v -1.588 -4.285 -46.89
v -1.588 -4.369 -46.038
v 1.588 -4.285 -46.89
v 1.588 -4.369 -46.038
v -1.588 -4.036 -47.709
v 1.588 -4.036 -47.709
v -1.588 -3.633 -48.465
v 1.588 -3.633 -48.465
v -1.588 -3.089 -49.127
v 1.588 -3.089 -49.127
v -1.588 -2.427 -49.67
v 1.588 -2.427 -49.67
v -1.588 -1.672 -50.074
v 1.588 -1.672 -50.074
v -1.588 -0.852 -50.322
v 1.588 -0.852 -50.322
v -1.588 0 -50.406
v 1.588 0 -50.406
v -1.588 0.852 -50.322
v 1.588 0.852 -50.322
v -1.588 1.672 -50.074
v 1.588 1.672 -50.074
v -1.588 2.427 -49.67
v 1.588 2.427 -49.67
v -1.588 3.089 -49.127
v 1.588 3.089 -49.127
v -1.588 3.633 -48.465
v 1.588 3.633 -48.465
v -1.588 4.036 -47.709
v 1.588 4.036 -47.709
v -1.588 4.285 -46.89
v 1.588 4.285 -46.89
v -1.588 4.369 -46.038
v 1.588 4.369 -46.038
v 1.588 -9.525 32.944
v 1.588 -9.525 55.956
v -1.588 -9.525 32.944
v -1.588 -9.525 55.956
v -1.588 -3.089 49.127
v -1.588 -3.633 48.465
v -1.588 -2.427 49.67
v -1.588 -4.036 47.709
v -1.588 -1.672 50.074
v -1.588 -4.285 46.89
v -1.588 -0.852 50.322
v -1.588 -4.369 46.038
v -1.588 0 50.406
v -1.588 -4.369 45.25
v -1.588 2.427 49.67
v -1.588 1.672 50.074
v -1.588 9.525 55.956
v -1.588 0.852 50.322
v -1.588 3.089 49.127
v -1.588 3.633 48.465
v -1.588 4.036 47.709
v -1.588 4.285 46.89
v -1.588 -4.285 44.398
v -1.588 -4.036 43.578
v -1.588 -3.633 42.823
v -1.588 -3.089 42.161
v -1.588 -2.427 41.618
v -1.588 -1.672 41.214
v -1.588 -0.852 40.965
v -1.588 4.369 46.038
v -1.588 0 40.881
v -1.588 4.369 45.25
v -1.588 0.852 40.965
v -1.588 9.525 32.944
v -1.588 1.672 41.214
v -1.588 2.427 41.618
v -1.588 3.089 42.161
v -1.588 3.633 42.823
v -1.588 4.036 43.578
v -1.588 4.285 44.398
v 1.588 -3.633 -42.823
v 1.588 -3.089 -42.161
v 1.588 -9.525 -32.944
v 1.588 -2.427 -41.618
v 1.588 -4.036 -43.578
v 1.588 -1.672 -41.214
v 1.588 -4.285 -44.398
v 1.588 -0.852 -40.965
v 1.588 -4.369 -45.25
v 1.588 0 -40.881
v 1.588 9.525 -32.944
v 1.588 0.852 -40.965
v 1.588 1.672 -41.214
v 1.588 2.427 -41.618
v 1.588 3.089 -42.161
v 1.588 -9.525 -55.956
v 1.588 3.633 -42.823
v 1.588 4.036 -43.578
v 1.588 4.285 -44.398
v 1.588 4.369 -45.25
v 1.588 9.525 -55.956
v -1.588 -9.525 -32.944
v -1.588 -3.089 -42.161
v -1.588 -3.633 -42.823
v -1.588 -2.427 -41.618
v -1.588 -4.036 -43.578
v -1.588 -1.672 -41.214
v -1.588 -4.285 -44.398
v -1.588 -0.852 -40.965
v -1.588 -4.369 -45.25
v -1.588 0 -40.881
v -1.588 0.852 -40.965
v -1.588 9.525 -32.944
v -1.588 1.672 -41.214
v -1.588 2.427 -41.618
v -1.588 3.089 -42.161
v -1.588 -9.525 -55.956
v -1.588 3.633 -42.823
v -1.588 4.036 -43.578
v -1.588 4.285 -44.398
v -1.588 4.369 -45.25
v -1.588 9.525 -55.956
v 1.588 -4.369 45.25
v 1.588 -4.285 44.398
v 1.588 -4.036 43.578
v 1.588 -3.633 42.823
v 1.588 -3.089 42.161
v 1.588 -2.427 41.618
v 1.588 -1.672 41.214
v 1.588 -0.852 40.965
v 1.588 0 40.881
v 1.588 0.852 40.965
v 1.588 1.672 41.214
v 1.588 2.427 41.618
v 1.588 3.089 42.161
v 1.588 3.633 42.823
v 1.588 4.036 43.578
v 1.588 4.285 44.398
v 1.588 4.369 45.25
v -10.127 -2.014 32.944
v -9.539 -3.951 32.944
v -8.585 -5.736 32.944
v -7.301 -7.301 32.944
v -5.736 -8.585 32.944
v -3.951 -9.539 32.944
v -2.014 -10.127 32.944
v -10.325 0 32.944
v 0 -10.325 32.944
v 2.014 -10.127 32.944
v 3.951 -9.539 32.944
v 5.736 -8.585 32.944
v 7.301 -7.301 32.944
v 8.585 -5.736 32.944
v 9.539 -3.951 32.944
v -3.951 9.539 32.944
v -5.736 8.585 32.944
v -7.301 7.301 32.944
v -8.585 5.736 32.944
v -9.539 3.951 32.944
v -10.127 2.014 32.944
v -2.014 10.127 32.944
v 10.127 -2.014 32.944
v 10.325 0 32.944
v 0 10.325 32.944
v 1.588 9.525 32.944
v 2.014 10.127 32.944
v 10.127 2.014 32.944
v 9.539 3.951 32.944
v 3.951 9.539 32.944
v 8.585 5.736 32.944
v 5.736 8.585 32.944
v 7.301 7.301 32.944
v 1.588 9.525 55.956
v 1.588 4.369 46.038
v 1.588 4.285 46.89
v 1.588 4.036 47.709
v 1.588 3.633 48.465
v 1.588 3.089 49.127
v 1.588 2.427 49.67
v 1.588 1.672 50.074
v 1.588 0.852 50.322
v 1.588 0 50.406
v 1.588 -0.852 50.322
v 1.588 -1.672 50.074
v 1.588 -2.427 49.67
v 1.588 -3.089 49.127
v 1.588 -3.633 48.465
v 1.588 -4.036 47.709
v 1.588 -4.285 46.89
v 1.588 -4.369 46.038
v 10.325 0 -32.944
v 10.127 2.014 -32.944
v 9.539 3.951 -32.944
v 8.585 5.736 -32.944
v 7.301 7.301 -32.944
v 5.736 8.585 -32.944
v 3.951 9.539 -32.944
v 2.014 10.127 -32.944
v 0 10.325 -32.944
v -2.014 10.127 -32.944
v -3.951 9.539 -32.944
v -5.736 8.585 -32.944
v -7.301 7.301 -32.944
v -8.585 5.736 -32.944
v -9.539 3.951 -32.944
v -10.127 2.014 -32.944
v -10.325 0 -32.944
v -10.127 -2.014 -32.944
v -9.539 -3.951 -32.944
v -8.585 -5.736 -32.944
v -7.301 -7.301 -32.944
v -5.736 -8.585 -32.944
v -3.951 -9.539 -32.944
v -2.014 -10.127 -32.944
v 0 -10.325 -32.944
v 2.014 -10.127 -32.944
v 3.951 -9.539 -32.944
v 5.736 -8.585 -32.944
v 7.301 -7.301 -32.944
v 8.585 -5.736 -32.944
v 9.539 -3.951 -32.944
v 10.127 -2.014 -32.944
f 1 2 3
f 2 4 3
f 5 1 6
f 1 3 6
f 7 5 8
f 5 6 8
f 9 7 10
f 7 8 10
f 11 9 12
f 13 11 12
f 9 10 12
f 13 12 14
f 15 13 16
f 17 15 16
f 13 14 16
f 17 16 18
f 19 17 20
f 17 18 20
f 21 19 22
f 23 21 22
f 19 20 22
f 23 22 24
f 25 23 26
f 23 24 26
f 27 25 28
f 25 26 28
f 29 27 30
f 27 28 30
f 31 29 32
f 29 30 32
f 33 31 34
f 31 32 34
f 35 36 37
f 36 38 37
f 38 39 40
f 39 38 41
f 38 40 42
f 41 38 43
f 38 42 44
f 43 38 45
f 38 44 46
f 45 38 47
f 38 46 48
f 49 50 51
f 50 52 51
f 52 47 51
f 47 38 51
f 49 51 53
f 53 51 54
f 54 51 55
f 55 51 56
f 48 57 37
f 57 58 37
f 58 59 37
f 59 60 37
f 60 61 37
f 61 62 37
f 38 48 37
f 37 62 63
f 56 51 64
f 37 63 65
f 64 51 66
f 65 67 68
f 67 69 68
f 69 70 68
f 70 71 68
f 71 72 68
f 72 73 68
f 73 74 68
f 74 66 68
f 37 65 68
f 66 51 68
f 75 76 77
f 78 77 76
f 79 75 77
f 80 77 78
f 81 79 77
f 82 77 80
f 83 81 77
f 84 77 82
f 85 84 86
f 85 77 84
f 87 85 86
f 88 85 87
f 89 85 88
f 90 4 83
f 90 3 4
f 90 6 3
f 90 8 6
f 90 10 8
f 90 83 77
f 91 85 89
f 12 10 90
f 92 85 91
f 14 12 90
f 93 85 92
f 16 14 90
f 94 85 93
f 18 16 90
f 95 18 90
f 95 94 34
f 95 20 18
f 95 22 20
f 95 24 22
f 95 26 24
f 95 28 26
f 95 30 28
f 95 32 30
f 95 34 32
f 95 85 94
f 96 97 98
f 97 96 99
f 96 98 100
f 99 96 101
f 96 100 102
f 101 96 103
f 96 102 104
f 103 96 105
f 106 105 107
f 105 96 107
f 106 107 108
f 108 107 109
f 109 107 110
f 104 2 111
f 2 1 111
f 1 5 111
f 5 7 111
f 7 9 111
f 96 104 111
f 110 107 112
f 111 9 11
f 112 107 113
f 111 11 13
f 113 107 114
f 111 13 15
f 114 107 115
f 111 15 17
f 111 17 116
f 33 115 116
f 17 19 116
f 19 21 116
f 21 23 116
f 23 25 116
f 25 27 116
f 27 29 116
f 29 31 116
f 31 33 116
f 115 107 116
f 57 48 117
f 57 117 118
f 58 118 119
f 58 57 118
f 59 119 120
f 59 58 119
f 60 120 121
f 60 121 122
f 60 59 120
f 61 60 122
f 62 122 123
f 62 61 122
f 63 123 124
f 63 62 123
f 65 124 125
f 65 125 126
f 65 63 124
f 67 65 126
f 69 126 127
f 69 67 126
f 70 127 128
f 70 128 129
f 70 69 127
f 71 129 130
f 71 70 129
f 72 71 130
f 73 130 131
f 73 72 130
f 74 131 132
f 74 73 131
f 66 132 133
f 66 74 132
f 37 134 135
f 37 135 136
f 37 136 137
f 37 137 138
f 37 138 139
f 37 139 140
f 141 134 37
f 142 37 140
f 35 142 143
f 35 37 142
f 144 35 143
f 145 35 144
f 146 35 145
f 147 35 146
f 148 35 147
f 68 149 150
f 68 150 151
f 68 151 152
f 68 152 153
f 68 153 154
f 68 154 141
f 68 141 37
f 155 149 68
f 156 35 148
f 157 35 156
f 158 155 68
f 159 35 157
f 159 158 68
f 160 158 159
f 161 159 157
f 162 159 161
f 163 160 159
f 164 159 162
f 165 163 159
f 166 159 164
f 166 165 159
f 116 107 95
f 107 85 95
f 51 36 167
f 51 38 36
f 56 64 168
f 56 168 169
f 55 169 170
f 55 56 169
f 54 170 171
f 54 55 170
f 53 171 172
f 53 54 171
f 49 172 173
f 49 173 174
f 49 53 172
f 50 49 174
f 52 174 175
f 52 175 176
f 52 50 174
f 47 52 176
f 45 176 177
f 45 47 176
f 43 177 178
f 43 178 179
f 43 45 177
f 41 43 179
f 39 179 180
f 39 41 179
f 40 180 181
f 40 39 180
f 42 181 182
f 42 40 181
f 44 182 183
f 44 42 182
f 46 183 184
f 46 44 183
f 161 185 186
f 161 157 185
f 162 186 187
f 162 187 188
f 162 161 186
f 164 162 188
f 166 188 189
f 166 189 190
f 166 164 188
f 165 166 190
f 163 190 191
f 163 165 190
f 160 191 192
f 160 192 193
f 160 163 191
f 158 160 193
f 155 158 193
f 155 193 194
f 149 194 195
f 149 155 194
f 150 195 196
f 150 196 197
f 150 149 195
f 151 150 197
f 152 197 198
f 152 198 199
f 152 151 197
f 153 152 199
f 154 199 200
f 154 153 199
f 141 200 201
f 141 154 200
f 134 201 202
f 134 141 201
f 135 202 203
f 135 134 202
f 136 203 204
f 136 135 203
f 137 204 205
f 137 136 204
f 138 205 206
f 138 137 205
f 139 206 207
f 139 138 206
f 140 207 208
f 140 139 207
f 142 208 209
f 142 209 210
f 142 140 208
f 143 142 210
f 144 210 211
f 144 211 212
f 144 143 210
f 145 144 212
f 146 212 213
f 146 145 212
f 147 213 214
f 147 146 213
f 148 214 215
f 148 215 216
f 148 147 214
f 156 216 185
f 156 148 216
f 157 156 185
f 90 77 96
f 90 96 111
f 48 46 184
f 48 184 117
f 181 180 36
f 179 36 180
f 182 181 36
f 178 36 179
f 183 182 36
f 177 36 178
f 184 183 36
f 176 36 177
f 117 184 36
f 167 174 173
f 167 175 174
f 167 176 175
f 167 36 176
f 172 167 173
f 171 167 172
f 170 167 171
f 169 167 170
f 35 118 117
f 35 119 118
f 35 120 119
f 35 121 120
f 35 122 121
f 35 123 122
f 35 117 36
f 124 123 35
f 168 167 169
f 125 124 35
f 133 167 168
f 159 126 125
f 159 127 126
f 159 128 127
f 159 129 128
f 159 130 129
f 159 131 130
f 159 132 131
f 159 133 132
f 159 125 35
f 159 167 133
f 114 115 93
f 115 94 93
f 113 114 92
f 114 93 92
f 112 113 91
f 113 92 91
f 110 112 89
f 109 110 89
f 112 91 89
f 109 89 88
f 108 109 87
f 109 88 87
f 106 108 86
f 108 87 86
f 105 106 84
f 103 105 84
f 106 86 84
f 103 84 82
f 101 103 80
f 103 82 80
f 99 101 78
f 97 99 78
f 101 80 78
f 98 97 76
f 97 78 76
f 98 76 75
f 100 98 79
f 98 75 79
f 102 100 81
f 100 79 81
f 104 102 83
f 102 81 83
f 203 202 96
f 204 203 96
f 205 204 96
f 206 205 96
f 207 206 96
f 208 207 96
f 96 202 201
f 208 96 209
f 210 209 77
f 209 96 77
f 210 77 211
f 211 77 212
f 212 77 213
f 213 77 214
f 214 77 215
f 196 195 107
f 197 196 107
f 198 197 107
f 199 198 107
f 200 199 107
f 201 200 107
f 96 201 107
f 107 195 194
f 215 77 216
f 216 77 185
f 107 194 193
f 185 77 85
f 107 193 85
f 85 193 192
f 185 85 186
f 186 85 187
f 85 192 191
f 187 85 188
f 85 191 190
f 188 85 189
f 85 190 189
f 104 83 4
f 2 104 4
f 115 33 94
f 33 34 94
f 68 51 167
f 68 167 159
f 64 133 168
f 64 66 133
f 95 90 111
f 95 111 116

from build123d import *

# Parameters (mm, degrees)
SKETCH1_R           = 10.325
BOSS_EXTRUDE1_DEPTH = 32.9438
SKETCH2_W           = 23.0124
SKETCH2_H           = 19.05
BOSS_EXTRUDE2_DEPTH = 1.5875


with BuildPart() as part:
    # Sketch1 → Boss-Extrude1 (new, symmetric)
    with BuildSketch(Plane.XY):
        Circle(SKETCH1_R)
    extrude(amount=BOSS_EXTRUDE1_DEPTH, both=True)

    # Sketch2 → Boss-Extrude2 (add, symmetric)
    # profile 1 of 2: a face of its own
    with BuildSketch(Plane(origin=(0, 0, 0), x_dir=(0, 0, -1), z_dir=(1, 0, 0))):
        with Locations((-44.45, 0)):
            Rectangle(SKETCH2_W, SKETCH2_H)
        with BuildLine():
            Line((-45.2501, 4.3688), (-46.0375, 4.3688))
            ThreePointArc((-46.0375, 4.3688), (-50.4063, 0), (-46.0375, -4.3688))
            Line((-46.0375, -4.3688), (-45.2501, -4.3688))
            ThreePointArc((-45.2501, -4.3688), (-40.8813, 0), (-45.2501, 4.3688))
        make_face(mode=Mode.SUBTRACT)
    # profile 2 of 2: a face of its own
    with BuildSketch(Plane(origin=(0, 0, 0), x_dir=(0, 0, -1), z_dir=(1, 0, 0))):
        with Locations((44.45, 0)):
            Rectangle(SKETCH2_W, SKETCH2_H)
        with BuildLine():
            Line((45.2501, -4.3688), (46.0375, -4.3688))
            ThreePointArc((46.0375, -4.3688), (50.4063, 0), (46.0375, 4.3688))
            Line((46.0375, 4.3688), (45.2501, 4.3688))
            ThreePointArc((45.2501, 4.3688), (40.8813, 0), (45.2501, -4.3688))
        make_face(mode=Mode.SUBTRACT)
    extrude(amount=BOSS_EXTRUDE2_DEPTH, both=True)


solid = part.part
